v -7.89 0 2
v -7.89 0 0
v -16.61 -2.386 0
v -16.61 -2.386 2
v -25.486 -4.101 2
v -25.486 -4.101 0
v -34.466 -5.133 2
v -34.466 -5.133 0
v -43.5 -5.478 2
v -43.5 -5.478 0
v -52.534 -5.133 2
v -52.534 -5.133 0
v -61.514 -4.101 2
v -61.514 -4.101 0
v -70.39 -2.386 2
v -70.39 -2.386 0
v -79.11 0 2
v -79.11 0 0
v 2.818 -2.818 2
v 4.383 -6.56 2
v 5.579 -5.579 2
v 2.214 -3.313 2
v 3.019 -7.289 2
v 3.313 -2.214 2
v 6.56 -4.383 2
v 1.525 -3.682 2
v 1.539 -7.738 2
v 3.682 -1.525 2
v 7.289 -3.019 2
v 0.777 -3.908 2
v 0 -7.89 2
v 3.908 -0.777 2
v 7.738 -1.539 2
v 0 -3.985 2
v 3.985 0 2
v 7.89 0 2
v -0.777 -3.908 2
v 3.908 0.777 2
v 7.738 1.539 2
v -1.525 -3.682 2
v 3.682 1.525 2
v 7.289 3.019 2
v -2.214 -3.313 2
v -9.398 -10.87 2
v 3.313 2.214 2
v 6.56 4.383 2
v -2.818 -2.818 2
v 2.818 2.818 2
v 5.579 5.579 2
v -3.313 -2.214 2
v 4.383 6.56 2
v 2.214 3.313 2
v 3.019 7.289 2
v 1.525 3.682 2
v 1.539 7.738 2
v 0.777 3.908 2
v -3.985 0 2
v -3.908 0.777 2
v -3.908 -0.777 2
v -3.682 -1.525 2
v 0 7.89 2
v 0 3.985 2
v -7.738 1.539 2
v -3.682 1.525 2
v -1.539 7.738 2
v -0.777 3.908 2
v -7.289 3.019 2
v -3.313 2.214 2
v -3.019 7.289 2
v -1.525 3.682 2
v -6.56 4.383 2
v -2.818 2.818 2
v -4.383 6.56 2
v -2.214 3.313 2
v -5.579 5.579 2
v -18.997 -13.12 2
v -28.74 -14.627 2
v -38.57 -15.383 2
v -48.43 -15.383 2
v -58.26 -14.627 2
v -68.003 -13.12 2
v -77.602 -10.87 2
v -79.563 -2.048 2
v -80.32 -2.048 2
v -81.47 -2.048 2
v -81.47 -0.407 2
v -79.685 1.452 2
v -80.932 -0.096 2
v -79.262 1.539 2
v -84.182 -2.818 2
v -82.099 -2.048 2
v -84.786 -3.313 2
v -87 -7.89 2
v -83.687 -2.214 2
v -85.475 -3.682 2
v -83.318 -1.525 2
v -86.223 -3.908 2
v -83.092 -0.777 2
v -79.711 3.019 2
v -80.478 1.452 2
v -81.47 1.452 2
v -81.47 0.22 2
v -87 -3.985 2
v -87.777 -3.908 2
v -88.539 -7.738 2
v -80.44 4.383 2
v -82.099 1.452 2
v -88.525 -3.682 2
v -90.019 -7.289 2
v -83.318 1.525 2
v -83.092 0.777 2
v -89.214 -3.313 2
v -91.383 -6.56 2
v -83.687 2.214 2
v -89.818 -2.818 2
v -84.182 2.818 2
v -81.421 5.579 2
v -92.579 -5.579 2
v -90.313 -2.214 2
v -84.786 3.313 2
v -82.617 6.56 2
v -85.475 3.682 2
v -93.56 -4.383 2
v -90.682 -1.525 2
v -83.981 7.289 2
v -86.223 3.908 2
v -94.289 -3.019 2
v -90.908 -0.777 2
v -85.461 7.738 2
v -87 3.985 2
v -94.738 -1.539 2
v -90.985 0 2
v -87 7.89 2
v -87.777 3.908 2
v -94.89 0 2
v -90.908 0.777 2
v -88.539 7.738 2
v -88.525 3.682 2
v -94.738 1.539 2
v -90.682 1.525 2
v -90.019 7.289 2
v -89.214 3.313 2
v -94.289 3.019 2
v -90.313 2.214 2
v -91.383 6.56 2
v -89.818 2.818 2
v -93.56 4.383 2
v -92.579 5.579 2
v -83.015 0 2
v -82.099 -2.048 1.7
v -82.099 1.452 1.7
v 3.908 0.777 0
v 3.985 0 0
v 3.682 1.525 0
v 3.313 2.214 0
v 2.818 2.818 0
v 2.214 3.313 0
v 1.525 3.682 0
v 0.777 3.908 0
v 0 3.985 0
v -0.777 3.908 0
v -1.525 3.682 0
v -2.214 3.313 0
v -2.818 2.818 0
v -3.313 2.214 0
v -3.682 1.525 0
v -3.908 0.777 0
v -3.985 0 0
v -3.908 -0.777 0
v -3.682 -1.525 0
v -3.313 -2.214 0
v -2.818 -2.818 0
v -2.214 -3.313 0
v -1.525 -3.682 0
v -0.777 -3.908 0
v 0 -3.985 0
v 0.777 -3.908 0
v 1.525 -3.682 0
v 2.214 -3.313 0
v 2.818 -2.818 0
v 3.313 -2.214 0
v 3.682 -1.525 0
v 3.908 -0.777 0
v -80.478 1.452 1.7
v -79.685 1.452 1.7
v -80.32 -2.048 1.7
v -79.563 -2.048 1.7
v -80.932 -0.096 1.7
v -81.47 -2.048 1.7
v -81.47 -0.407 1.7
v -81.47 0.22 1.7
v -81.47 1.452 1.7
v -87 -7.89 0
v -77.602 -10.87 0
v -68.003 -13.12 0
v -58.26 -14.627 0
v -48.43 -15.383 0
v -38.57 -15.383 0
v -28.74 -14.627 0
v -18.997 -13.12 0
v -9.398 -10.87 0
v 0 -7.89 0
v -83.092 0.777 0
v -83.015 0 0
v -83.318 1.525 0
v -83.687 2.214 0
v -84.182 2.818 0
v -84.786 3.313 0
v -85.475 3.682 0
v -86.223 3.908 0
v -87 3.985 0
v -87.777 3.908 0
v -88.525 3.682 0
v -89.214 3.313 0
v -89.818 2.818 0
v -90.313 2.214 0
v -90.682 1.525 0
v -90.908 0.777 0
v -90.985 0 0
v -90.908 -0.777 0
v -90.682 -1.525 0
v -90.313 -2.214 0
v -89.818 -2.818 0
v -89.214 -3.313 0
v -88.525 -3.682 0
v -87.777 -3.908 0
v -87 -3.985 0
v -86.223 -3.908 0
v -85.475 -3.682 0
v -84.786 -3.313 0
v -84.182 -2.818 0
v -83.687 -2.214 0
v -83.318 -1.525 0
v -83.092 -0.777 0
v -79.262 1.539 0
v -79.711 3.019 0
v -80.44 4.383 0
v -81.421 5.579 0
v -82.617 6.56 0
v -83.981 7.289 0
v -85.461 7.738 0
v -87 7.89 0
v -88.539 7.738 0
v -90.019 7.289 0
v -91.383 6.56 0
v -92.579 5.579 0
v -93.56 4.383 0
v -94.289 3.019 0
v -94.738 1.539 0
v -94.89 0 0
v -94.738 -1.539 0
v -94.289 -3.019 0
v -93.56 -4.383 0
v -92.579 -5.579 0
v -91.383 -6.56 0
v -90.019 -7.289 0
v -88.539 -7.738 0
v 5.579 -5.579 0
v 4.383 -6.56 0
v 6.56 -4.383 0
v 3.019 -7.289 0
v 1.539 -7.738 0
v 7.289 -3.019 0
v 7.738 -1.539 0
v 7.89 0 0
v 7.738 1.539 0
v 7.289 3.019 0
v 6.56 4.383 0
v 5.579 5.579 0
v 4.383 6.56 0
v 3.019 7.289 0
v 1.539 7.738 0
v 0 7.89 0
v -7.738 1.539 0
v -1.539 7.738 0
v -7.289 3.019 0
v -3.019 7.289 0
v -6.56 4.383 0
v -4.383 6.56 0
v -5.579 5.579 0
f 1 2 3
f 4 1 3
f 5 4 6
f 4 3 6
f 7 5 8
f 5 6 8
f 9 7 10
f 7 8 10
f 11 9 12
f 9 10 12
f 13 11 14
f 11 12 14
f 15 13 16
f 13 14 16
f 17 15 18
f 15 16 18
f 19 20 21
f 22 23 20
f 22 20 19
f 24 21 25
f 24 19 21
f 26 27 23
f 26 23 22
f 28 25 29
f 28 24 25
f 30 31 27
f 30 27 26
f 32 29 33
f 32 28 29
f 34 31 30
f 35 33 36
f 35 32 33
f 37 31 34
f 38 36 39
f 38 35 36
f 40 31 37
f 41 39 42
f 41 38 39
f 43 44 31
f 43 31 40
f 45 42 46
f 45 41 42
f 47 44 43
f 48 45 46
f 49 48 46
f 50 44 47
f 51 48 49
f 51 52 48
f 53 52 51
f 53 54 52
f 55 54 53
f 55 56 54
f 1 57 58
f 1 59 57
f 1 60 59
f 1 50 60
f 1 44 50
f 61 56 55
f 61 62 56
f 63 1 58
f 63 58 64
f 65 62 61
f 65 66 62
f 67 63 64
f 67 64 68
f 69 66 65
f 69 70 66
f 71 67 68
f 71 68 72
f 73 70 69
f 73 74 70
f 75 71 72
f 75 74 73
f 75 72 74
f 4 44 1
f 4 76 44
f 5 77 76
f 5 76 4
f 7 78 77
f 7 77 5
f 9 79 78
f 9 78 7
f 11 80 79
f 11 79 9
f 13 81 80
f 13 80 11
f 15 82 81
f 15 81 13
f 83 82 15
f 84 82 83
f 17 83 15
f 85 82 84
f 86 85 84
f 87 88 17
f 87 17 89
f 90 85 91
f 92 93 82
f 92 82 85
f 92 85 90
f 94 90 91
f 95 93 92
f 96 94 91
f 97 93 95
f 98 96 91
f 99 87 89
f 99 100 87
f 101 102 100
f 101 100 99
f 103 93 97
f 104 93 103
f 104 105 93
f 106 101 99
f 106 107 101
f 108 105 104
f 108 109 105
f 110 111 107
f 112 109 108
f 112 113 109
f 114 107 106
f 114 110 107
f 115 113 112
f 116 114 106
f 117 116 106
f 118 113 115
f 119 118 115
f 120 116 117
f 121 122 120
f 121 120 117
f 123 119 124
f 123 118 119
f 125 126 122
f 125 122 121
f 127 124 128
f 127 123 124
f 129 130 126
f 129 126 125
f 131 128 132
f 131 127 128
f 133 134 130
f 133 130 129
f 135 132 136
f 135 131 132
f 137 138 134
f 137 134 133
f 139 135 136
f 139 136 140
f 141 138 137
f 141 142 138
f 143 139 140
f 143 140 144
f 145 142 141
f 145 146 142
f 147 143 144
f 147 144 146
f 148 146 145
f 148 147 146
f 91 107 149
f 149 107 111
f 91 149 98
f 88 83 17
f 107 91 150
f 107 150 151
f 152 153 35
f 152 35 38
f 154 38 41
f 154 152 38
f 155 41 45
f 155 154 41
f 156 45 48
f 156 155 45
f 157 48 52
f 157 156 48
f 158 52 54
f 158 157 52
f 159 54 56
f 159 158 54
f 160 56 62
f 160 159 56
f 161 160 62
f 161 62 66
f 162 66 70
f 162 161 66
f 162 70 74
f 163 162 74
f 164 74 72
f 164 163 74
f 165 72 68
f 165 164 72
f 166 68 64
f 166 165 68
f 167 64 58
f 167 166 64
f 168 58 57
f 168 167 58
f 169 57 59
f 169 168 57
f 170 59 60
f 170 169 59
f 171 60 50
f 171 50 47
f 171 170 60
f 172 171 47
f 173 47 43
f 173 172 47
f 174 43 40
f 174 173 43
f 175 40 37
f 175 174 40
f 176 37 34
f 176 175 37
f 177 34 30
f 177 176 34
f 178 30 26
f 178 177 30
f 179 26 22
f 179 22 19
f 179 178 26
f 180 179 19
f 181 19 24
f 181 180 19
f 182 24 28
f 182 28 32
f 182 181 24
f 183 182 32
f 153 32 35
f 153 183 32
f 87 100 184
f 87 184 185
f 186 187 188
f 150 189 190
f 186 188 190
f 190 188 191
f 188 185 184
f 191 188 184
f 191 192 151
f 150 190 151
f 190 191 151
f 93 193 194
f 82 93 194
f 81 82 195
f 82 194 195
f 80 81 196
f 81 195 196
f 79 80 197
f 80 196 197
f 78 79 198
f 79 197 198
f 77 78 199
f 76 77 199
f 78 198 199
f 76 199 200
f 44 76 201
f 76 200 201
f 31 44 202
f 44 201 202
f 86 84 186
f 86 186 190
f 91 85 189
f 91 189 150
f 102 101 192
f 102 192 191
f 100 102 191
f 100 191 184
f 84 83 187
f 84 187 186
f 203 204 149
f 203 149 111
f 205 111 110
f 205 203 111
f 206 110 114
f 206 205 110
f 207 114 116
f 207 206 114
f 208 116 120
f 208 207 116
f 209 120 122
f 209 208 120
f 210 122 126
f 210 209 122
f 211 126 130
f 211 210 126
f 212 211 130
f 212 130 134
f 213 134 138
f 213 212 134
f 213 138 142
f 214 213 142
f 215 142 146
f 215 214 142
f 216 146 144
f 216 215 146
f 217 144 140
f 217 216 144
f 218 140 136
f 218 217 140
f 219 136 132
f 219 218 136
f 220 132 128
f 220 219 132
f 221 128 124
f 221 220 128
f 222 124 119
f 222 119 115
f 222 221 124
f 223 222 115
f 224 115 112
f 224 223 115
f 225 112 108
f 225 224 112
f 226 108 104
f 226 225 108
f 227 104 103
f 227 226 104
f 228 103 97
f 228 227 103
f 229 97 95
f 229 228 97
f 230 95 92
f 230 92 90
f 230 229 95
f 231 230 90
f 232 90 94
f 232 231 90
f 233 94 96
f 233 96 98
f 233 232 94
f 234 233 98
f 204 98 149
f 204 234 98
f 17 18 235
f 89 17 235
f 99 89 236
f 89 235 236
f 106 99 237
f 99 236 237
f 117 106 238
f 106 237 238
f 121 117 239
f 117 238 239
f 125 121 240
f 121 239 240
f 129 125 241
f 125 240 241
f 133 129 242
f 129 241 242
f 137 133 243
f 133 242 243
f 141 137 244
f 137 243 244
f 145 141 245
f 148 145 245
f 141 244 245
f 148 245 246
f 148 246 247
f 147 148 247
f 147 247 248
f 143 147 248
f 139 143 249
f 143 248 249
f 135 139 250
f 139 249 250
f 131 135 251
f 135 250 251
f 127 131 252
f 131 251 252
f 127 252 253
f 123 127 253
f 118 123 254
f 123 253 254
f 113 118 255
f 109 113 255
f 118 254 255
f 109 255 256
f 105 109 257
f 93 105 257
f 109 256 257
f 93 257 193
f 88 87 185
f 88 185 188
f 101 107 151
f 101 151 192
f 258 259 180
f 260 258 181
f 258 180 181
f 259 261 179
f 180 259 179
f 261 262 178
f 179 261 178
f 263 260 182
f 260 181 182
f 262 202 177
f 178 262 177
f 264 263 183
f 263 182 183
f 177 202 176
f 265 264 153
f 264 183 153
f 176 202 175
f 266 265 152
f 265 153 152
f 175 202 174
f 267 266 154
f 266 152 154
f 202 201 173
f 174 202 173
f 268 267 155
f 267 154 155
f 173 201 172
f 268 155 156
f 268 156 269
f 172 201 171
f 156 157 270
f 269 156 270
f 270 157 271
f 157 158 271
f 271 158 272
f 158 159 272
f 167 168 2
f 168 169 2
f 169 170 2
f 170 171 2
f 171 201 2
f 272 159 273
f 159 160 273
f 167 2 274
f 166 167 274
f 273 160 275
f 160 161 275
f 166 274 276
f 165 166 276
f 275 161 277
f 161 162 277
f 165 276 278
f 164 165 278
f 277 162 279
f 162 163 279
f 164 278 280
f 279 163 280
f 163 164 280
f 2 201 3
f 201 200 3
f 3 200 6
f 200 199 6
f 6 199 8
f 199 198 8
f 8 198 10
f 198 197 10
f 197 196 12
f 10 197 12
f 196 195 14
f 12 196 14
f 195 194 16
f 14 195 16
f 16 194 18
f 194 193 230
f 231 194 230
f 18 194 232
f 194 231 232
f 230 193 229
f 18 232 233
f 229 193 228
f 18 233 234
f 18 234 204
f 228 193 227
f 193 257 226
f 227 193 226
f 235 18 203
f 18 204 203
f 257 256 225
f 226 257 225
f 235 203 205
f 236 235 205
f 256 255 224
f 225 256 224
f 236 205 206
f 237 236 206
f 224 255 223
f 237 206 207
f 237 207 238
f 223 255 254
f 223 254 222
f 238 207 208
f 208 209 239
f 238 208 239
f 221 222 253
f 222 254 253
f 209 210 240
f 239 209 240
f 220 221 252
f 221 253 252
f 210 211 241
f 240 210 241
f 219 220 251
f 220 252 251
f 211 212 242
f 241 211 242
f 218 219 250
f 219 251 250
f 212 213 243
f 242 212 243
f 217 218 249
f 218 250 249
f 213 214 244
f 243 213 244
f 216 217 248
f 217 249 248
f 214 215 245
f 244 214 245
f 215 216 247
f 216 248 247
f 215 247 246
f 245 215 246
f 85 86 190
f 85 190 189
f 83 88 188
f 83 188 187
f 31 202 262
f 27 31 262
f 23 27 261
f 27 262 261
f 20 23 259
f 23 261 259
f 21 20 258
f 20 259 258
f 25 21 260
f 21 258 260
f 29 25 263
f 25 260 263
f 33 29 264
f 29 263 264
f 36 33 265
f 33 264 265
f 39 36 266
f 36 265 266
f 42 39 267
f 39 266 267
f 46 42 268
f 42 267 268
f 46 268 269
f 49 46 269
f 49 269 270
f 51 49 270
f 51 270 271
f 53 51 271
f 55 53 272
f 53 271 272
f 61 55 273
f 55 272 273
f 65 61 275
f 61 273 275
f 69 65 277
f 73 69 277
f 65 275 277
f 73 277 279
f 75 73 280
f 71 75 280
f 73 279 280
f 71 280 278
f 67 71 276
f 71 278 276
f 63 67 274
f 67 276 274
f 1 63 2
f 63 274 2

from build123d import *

# Parameters (mm, degrees)
ESQUISSE1_R             = 3.985
BOSS_EXTRU_1_DEPTH      = 2
ENL_V_MAT_EXTRU_1_DEPTH = 0.3


with BuildPart() as part:
    # Esquisse1 → Boss.-Extru.1 (new body)
    with BuildSketch(Plane(origin=(0, 0, 0), x_dir=(0, 1, 0), z_dir=(0, 0, 1))):
        with BuildLine():
            ThreePointArc((-7.89, 0), (5.579072504, -5.579072504), (0, 7.89))
            ThreePointArc((0, 7.89), (-5.478052173, 43.5), (0, 79.11))
            ThreePointArc((0, 79.11), (5.579072504, 92.579072504), (-7.89, 87))
            ThreePointArc((-7.89, 87), (-15.478052173, 43.5), (-7.89, 0))
        make_face()
        with Locations(Location((0, 0, 0), (0, 0, 270))):
            Circle(ESQUISSE1_R, mode=Mode.SUBTRACT)
        with Locations(Location((0, 87, 0), (0, 0, 270))):
            Circle(ESQUISSE1_R, mode=Mode.SUBTRACT)
    extrude(amount=BOSS_EXTRU_1_DEPTH)

    # Esquisse2 → Enlèv. mat.-Extru.1 (cut)
    with BuildSketch(Plane.XY.offset(2)):
        Polygon((-82.098700293, 1.451884906), (-81.470495165, 1.451884906), (-81.470495165, 0.220013912), (-80.477706704, 1.451884906), (-79.684737954, 1.451884906), (-80.932033627, -0.096192018), (-79.563443883, -2.048115094), (-80.3199543, -2.048115094), (-81.470495165, -0.406788973), (-81.470495165, -2.048115094), (-82.098700293, -2.048115094), align=None)
    extrude(amount=-ENL_V_MAT_EXTRU_1_DEPTH, mode=Mode.SUBTRACT)


solid = part.part
